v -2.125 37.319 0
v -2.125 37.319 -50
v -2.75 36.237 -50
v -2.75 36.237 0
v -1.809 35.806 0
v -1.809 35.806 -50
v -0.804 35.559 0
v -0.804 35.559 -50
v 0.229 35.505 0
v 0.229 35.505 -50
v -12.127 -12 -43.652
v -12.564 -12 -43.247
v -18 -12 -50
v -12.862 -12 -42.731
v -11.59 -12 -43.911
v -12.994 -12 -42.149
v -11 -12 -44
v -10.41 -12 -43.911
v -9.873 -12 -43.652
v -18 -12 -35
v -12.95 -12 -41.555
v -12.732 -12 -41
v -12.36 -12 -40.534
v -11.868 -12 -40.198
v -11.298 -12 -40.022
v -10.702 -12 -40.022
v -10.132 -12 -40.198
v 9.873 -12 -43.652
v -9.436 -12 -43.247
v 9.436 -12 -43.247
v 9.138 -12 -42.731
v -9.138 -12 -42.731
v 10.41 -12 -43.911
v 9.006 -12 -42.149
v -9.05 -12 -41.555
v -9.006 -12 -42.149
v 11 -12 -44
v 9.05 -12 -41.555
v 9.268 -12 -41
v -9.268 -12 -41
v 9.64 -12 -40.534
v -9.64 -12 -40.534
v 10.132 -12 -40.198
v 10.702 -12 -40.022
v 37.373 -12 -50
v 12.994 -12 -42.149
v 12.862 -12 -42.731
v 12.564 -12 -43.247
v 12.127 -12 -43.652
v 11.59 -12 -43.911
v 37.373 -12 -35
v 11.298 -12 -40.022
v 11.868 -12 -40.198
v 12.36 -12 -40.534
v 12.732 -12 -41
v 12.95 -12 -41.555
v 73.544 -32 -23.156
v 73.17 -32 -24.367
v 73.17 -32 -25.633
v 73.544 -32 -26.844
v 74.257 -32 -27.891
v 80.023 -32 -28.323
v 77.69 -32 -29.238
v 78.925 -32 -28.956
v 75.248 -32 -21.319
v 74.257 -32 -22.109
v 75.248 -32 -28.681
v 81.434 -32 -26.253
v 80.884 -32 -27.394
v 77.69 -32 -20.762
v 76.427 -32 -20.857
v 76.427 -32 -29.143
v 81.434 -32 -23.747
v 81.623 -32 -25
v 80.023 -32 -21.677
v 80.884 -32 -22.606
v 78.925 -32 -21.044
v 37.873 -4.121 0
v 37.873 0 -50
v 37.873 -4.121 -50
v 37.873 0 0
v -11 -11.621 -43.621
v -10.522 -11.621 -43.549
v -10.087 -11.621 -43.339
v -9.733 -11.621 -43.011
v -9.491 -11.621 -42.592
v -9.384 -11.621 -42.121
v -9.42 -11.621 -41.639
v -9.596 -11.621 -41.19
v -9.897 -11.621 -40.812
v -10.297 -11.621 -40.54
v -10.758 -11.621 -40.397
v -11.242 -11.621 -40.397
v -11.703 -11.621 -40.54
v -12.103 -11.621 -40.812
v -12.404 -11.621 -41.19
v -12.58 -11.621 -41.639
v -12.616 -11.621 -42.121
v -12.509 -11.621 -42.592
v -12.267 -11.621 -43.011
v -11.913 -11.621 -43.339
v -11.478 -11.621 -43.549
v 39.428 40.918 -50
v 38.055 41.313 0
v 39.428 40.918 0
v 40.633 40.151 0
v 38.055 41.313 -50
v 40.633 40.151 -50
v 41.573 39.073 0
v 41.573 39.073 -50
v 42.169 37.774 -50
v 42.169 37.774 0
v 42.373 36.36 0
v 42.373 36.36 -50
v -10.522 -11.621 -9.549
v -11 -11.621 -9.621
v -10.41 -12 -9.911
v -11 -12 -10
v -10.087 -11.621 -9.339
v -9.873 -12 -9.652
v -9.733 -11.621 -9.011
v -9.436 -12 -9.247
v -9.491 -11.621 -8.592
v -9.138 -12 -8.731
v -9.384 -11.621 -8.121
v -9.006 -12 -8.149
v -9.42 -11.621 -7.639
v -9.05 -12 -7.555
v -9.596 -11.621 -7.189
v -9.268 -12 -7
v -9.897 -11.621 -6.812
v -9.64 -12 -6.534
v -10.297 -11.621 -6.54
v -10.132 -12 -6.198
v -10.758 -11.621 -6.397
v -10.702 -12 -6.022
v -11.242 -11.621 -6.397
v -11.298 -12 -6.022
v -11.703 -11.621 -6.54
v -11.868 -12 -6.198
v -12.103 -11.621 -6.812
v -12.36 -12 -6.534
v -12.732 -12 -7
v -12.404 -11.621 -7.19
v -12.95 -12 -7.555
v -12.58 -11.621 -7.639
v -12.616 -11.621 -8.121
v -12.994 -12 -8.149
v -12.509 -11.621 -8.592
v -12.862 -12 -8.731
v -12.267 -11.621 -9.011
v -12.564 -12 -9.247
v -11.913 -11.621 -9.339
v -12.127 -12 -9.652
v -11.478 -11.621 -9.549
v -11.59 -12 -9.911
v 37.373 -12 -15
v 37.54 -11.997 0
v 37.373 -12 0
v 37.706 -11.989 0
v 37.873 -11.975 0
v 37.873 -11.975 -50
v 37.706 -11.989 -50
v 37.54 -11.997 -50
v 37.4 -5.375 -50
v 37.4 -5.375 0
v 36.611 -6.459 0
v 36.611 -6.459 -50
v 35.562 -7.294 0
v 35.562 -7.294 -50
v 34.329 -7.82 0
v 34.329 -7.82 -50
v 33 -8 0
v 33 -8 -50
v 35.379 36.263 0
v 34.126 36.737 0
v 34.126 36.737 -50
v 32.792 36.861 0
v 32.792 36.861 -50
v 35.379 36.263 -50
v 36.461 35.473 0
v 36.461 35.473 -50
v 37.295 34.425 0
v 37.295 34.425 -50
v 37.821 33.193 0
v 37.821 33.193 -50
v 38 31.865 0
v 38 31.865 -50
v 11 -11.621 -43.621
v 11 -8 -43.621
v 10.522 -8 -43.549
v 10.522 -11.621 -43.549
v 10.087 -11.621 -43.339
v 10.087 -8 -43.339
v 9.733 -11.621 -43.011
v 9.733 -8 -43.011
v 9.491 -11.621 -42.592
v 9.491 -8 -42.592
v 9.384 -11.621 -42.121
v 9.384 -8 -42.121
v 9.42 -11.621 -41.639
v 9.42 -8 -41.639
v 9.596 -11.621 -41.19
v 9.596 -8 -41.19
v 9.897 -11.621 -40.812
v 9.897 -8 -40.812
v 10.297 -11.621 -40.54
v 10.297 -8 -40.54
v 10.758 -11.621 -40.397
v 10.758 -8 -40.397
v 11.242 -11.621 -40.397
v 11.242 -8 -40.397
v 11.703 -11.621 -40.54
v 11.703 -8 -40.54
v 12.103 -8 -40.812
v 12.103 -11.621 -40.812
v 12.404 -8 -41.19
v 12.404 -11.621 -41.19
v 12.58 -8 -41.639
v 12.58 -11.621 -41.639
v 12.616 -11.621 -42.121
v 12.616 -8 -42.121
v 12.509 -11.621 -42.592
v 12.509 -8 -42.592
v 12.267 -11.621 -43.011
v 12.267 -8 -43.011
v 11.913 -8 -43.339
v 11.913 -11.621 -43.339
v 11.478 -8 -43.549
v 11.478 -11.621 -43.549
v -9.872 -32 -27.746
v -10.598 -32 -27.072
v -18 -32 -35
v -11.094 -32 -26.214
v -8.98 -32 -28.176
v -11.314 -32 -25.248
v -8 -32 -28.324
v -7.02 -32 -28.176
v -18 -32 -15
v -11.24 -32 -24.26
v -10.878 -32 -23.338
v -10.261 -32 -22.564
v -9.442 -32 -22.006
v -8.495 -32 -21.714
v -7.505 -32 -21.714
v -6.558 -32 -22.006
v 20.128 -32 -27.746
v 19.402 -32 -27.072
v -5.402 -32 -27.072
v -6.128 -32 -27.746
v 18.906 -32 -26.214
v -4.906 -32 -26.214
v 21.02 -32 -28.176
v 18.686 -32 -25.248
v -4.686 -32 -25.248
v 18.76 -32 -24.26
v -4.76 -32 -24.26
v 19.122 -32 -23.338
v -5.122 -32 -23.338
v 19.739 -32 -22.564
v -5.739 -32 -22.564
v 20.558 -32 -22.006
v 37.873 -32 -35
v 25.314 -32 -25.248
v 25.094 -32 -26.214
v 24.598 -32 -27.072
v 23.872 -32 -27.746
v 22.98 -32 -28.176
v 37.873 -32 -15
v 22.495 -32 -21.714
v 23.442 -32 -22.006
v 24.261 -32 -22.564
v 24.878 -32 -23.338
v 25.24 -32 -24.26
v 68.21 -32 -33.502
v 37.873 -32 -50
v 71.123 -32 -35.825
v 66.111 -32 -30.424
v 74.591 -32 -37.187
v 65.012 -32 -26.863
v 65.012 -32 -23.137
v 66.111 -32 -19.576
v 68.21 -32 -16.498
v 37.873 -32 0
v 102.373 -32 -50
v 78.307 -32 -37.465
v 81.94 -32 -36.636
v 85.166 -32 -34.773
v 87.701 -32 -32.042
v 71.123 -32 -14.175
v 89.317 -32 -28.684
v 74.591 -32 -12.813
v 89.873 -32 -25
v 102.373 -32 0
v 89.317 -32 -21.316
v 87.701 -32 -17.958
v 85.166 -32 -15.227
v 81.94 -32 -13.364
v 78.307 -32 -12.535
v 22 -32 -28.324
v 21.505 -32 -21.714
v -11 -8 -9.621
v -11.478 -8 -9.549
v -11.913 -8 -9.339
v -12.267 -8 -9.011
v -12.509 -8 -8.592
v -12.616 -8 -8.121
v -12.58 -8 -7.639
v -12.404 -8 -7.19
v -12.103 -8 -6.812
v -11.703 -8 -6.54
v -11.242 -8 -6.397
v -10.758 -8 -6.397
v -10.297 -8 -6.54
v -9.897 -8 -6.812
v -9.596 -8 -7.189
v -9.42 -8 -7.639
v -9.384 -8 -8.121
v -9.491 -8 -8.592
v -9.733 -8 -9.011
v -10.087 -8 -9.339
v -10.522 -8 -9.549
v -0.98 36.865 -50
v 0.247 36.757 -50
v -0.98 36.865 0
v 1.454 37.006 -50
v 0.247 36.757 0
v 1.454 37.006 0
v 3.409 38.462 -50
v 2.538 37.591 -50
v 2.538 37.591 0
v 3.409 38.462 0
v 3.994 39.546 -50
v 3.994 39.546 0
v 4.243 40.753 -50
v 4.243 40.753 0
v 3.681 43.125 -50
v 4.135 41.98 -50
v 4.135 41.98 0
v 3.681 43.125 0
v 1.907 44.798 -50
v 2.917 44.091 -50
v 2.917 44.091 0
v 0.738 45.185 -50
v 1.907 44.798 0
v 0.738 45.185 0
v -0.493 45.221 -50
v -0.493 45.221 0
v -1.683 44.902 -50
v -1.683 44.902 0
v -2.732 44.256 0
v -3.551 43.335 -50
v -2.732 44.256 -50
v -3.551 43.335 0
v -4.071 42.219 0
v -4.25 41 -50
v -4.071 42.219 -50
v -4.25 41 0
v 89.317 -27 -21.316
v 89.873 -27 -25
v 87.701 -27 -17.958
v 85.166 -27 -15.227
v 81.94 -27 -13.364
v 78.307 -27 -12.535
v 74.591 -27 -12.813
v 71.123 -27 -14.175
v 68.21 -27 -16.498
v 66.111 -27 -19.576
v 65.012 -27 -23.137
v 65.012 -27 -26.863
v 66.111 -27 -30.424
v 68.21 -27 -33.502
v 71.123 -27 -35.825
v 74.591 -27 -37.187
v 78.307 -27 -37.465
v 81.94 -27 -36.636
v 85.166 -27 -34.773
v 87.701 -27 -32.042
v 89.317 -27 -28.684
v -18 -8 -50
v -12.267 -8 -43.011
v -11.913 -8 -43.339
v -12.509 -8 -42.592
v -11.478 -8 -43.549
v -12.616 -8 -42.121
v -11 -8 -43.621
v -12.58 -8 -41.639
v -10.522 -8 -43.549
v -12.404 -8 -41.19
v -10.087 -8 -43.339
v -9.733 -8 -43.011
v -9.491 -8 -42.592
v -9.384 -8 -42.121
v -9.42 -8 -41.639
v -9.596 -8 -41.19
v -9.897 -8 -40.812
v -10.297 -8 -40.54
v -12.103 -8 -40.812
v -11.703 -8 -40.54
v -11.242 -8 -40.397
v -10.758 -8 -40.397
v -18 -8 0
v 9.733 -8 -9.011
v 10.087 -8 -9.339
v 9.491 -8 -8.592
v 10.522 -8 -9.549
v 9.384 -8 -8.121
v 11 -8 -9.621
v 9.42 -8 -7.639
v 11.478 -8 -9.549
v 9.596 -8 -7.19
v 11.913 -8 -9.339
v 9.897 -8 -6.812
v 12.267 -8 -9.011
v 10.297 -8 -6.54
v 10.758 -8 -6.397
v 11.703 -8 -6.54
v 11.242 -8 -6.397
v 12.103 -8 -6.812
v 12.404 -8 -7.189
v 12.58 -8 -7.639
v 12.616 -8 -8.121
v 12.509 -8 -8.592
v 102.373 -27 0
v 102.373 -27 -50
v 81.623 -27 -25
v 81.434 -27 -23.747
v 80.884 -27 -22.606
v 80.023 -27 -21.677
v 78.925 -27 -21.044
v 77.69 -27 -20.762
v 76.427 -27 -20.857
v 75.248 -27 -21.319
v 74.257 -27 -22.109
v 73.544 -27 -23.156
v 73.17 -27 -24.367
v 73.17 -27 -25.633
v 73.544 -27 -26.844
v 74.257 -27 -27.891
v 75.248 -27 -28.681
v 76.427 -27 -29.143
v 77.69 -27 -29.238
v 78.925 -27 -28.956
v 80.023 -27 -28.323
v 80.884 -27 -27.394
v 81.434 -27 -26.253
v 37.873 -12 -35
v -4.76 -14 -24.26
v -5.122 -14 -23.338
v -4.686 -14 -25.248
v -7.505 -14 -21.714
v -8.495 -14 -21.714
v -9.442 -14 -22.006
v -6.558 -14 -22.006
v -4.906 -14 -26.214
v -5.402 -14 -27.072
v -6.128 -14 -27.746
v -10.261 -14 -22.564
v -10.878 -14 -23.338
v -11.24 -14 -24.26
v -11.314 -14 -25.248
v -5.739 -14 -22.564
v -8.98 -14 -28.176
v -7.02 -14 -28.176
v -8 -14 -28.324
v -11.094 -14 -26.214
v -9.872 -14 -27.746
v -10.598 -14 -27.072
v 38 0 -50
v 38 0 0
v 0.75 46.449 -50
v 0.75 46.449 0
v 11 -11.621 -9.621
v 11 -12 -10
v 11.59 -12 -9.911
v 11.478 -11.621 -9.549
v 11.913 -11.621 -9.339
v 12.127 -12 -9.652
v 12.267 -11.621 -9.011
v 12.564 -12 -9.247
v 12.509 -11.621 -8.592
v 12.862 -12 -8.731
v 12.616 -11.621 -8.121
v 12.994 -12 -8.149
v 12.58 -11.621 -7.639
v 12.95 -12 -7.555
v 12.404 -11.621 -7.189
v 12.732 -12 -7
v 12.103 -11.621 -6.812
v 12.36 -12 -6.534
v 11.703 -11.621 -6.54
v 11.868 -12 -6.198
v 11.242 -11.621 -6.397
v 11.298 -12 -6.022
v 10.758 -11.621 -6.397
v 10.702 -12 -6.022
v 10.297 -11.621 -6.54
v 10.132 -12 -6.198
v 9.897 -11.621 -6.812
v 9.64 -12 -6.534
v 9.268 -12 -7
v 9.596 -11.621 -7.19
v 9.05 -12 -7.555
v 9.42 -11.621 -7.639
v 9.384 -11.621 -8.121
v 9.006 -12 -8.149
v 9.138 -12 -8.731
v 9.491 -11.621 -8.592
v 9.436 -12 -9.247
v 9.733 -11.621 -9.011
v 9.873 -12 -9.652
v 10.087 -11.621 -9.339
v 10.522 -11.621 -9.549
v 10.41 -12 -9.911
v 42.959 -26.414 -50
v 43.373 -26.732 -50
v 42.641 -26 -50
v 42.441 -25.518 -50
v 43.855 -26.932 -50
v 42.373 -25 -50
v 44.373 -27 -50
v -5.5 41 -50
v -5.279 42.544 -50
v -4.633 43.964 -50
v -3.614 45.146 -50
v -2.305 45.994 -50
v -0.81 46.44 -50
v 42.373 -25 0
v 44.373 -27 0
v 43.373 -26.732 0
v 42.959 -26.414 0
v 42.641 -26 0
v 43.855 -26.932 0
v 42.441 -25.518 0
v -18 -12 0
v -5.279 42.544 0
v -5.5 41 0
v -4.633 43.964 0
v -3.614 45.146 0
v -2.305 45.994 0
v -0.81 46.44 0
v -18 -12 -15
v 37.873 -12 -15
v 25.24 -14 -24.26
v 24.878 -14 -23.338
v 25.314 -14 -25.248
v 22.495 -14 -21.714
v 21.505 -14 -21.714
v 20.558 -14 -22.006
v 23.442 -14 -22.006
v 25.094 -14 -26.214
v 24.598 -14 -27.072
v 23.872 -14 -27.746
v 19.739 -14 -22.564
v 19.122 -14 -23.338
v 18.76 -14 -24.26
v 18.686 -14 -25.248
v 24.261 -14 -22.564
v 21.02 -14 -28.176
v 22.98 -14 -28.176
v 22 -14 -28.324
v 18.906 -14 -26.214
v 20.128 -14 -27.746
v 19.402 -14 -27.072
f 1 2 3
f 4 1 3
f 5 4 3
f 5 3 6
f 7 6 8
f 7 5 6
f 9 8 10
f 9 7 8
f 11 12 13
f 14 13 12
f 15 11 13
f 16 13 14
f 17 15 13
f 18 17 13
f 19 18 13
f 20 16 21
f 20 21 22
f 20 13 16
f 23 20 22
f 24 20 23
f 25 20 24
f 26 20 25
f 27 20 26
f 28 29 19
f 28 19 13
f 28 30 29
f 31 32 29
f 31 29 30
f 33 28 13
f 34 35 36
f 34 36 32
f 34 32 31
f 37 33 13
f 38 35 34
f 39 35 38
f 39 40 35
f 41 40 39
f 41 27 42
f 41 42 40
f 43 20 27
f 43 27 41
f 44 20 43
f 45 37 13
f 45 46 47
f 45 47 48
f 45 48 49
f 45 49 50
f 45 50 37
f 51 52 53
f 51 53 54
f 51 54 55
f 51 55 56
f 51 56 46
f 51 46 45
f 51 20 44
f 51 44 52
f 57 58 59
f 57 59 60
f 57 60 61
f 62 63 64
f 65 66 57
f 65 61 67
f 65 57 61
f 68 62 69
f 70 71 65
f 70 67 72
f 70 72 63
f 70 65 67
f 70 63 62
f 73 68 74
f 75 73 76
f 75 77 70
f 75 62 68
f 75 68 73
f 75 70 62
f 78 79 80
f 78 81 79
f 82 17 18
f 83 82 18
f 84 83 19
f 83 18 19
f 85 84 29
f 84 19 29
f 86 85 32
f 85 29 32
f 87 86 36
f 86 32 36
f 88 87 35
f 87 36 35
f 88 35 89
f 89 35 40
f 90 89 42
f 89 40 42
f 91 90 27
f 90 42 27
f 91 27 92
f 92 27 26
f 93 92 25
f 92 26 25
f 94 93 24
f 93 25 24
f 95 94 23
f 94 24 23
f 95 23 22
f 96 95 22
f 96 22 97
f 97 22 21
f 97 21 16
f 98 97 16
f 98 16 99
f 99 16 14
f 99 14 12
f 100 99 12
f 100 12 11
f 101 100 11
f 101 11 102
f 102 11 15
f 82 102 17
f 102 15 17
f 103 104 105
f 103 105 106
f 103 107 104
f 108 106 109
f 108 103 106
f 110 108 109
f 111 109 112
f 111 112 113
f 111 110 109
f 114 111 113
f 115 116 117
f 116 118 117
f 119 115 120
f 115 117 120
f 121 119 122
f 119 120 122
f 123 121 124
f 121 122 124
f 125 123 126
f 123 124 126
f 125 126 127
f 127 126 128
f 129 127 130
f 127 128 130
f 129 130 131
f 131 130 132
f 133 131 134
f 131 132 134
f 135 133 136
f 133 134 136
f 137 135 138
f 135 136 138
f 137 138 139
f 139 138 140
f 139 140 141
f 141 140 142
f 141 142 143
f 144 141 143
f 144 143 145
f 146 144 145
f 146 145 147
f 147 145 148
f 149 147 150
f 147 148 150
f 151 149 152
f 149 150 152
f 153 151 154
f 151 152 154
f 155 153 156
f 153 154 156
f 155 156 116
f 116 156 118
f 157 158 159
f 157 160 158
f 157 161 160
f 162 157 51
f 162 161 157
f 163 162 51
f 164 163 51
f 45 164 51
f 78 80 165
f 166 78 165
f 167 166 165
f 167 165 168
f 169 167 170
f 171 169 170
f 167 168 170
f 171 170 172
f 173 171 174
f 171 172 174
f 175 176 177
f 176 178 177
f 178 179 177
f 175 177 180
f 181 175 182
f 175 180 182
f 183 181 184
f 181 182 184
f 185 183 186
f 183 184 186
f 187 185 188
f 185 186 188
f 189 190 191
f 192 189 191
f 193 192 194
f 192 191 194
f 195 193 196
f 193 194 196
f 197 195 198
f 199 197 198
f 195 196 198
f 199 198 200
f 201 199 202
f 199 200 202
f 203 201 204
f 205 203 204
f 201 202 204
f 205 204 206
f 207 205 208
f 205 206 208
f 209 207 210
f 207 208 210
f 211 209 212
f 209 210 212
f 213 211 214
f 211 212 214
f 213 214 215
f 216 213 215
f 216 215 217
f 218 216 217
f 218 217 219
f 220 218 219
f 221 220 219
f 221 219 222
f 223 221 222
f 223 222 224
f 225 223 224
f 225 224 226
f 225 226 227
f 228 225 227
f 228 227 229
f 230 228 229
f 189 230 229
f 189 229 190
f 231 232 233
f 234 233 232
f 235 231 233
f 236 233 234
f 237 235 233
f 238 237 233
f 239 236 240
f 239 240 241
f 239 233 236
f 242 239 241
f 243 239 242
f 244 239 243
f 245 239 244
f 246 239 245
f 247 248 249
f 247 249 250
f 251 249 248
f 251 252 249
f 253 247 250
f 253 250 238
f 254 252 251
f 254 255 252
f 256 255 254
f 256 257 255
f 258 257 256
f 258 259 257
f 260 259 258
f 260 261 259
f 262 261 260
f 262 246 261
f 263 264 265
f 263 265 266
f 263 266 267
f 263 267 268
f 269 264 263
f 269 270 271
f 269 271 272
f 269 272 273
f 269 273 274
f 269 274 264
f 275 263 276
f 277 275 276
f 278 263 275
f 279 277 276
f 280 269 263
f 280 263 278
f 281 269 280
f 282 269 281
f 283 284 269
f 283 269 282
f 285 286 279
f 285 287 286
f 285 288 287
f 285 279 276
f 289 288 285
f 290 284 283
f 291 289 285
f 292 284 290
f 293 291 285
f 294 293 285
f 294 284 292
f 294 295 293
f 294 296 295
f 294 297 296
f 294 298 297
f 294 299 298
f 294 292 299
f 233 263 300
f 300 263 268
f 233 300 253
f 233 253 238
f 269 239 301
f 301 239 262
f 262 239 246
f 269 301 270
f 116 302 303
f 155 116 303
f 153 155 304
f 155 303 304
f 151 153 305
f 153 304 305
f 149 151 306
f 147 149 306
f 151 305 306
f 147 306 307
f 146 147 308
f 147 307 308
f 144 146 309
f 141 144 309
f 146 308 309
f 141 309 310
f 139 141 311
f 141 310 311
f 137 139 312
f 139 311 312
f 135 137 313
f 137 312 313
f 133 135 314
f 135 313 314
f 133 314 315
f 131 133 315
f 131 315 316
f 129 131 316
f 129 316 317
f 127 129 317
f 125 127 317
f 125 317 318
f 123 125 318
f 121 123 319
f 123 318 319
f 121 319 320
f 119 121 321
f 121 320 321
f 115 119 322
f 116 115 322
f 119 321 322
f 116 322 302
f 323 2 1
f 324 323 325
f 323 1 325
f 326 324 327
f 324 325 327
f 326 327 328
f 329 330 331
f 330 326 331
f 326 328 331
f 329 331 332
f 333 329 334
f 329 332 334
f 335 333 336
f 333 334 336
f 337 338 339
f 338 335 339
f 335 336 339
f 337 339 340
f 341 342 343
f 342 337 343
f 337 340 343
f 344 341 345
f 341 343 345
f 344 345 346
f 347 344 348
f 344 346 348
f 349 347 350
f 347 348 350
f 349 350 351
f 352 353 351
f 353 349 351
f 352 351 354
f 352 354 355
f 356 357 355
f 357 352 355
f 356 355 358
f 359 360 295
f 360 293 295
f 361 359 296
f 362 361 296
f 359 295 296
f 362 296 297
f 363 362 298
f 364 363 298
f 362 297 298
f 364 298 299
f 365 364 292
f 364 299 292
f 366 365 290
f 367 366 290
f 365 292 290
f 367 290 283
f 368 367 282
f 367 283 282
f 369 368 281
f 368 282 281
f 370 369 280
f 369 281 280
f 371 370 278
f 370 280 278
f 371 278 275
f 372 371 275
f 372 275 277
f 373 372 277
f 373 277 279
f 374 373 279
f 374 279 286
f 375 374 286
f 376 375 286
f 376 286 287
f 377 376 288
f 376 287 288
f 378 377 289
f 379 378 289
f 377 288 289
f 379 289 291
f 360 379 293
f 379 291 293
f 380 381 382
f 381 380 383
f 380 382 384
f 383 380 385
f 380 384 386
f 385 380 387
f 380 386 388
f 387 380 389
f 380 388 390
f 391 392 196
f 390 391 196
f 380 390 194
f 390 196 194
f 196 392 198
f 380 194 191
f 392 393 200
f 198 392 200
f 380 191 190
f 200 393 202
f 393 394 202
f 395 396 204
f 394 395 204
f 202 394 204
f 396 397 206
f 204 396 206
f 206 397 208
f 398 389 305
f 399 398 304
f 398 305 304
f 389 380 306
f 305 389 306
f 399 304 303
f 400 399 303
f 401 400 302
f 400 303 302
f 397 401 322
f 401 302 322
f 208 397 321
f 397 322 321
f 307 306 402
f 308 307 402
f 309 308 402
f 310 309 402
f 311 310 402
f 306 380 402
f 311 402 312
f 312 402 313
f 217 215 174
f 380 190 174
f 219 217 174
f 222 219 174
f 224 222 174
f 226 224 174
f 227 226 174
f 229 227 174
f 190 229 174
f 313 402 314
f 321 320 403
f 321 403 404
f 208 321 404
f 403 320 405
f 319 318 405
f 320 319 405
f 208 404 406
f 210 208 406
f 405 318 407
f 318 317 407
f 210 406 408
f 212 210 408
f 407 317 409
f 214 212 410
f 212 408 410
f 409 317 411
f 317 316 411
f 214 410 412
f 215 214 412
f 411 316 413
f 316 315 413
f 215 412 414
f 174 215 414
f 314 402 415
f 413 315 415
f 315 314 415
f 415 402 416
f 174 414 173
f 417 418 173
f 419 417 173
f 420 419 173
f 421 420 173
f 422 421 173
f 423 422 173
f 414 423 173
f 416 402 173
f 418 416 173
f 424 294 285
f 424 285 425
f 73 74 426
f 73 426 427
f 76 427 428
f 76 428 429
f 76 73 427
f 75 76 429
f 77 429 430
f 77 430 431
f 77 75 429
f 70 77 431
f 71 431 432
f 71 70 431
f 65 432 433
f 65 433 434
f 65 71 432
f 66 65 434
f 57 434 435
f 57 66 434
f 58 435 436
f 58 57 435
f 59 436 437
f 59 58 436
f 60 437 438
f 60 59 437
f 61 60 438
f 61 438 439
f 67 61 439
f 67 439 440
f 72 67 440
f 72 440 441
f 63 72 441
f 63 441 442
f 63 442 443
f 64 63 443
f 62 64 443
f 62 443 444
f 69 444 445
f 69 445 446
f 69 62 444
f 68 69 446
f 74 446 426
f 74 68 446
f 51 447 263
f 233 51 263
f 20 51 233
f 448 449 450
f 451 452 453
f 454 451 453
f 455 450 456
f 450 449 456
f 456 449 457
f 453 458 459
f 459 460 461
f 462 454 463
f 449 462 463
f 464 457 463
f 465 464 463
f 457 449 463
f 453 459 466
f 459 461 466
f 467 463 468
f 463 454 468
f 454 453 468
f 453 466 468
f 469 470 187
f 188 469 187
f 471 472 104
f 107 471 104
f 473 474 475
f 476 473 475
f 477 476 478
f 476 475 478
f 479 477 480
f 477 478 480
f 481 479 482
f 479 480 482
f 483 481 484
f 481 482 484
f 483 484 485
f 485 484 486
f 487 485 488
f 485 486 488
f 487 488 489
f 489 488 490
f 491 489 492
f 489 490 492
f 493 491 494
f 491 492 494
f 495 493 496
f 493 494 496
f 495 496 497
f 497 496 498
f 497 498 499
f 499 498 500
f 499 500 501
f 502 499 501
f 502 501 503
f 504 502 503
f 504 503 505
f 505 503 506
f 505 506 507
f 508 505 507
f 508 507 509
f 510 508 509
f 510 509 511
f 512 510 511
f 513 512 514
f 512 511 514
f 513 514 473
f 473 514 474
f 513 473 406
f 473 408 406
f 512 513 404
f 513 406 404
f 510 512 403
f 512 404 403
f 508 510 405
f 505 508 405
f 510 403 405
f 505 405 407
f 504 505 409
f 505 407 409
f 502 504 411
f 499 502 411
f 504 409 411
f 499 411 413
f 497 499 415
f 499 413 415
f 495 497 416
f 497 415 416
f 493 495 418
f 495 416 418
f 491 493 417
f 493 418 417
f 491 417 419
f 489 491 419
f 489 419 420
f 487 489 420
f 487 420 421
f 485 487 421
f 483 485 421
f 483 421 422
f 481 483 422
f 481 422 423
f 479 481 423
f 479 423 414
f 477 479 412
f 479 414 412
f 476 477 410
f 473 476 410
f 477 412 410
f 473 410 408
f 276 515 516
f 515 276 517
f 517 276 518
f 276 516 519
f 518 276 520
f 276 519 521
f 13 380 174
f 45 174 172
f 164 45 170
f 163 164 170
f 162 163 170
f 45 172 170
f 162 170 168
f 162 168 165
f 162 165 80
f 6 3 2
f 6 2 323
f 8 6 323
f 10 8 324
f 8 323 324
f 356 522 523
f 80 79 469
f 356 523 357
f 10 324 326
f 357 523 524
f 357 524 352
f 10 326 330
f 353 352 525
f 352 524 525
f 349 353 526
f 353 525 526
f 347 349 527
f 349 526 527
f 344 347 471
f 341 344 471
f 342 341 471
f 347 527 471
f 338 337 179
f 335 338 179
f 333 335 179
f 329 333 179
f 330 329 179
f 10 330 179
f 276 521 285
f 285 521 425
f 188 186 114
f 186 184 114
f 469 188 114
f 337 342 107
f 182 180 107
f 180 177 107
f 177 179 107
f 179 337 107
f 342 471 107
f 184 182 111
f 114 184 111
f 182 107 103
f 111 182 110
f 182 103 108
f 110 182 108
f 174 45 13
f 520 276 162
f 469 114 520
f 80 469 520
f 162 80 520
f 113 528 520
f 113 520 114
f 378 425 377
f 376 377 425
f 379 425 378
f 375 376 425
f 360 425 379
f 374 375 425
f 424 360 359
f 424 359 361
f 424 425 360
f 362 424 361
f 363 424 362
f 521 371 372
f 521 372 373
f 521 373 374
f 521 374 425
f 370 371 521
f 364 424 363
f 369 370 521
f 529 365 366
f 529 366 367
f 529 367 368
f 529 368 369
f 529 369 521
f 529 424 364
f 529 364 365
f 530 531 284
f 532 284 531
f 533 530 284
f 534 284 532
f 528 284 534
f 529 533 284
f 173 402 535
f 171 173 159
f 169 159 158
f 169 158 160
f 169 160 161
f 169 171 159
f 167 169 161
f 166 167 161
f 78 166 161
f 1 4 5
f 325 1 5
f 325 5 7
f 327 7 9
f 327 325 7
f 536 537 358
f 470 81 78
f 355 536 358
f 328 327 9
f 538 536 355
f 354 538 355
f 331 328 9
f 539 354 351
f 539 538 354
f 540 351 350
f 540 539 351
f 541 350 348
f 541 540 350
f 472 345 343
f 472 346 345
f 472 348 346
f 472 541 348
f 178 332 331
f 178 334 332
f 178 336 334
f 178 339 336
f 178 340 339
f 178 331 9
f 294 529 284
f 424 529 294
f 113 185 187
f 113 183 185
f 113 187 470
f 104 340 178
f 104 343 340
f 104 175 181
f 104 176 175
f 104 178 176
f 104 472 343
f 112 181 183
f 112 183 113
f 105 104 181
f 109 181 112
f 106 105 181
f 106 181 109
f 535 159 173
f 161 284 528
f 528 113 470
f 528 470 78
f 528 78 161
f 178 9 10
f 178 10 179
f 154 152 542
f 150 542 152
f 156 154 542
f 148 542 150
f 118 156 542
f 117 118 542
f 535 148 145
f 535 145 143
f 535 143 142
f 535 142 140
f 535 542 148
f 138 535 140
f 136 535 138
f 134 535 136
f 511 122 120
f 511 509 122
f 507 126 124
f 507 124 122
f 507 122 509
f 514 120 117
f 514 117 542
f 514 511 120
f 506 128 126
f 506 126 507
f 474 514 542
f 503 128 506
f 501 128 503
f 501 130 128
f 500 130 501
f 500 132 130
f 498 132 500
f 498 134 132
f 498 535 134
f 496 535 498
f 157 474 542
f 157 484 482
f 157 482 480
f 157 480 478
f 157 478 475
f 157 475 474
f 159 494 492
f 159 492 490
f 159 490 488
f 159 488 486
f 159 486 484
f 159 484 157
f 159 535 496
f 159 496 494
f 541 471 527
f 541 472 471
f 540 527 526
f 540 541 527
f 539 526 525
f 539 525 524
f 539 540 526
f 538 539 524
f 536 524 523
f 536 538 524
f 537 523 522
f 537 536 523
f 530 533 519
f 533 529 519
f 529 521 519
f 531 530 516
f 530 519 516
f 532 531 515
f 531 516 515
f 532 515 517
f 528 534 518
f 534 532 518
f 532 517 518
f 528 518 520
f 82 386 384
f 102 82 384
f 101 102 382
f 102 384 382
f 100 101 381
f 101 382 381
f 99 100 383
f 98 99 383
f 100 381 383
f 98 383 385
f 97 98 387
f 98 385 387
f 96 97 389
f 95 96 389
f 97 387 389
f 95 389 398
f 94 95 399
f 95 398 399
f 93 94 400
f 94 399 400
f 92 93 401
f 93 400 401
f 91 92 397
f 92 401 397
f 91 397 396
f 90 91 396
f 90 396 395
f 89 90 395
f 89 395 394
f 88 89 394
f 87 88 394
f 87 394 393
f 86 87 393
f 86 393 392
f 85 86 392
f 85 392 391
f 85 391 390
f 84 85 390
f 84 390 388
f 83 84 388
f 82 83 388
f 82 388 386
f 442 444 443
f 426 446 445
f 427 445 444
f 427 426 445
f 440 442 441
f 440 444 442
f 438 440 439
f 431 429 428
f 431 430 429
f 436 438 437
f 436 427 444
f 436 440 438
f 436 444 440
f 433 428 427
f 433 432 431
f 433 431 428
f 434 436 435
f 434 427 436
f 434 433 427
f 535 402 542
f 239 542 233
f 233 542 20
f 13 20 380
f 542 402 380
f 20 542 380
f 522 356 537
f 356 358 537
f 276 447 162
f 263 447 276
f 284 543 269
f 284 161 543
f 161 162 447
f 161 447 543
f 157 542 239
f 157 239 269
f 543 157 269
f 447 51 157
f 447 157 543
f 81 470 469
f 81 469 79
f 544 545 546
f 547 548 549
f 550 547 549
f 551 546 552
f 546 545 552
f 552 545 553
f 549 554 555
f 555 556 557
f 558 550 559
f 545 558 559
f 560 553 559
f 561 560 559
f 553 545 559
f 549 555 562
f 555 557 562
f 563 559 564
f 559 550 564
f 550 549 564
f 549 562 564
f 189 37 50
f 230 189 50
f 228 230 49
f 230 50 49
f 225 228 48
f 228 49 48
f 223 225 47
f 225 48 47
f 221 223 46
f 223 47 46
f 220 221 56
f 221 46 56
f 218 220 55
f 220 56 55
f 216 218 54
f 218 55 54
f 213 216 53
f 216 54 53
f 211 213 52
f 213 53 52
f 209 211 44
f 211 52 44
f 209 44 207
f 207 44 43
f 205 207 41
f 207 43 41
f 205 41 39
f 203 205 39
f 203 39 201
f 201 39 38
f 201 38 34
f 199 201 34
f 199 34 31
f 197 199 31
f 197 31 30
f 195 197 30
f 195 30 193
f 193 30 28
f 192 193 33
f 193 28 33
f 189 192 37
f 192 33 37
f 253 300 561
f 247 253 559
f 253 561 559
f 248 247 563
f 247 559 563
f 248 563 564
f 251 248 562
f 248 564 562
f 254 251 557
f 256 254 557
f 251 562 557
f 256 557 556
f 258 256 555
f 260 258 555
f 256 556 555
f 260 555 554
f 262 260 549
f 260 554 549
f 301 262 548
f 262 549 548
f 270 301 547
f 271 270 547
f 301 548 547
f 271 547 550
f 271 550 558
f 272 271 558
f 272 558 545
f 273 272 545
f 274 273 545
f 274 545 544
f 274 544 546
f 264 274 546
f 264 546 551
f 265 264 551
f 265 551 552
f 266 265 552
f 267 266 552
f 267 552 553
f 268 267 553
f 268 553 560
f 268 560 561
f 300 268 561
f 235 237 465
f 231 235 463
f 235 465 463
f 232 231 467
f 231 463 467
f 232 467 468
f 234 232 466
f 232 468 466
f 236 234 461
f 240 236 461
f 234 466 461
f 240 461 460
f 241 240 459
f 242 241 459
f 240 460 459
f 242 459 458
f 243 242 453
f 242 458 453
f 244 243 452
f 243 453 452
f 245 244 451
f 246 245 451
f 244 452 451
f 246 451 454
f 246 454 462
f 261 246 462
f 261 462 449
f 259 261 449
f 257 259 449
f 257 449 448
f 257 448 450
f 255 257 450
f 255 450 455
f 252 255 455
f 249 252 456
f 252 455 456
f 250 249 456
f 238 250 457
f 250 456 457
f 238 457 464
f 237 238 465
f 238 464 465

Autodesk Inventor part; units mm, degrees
ref_plane "YZ Plane" through (0, 0, 0) normal (1, 0, 0) x (0, 1, 0)
ref_plane "XZ Plane" through (0, 0, 0) normal (0, 1, 0) x (-1, 0, 0)
ref_plane "XY Plane" through (0, 0, 0) normal (0, 0, 1) x (1, 0, 0)
sketch "草图1" plane through (0, 0, 0) normal (0, 0, 1) x (1, 0, 0)
  circle A0 centre (0, 41) radius 4.25 projected
  circle A1 centre (0, 41) radius 4.25
  line L0 (0, 41) -> (-2.75, 36.2369)
  line L1 (0, 41) -> (5.5, 41) construction
  line L2 (0, 41) -> (-5.5, 41)
  line L3 (0.7501, 46.4486) -> (42.3728, 40.7189)
  line L4 (-15, 3) -> (-15, 6) projected
  line L5 (-15, 6) -> (-18, 6) projected
  line L6 (-18, 6) -> (-18, -8) projected
  line L7 (-4, -8) -> (-18, -8) projected
  line L8 (-4, -6) -> (-4, -8) projected
  line L9 (-4, -6) -> (4, -6) projected
  line L10 (4, -6) -> (4, -8) projected
  line L11 (18, -8) -> (4, -8) projected
  line L12 (18, 6) -> (18, -8) projected
  line L13 (18, 6) -> (15, 6) projected
  line L14 (15, 6) -> (15, 3) projected
  line L15 (15, 3) -> (13.5, 3) projected
  line L16 (13.5, 3) -> (13.5, 2) projected
  line L17 (13.5, 2) -> (15, 2) projected
  line L18 (15, 2) -> (15, -2) projected
  line L19 (15, -2) -> (-15, -2) projected
  line L20 (-15, -2) -> (-15, 2) projected
  line L21 (-15, 2) -> (-13.5, 2) projected
  line L22 (-13.5, 2) -> (-13.5, 3) projected
  line L23 (-13.5, 3) -> (-15, 3) projected
  line L24 (-18, -8) -> (18, -8)
  line L25 (18, -8) -> (18, -12)
  line L26 (18, -12) -> (-18, -12)
  line L27 (-18, -12) -> (-18, -8)
  line L28 (18, -12) -> (42.3728, -12)
  line L29 (42.3728, -12) -> (42.3728, 40.7189)
  line L30 (18, -8) -> (38, -8)
  line L31 (38, -8) -> (38, 37.0777)
  line L32 (0.2288, 35.5048) -> (38, 37.0777)
  arc A2 (-2.75, 36.2369) -> (0.2288, 35.5048) centre (0, 41) ccw
  arc A3 (0.7501, 46.4486) -> (-5.5, 41) centre (0, 41) ccw
  point P0 (0, 0)
  point P1 (-4.25, 41)
  point P2 (-2.125, 37.3194)
  dimension "d1" = 120
  dimension "d2" = 4
  dimension "d3" = 20
extrude "拉伸1" add sketch "草图1" against normal blind 50 contours A0 L2 A3 L3 L29 L28 L25 L30 L31 L32 A2 L0 | L26 L27 L7 L24 L11 L25
fillet "圆角1" radius 5 2 edges at (38, 37.0777, -25) (42.3728, 40.7189, -25)
fillet "圆角2" radius 5 2 edges at (38, -8, -25) (42.3728, -12, -25)
sketch "草图2" plane through (-18, -12, -50) normal (0, -1, 0) x (1, 0, 0)
  line L0 (0, 50) -> (55.3728, 50) projected
  line L1 (0, 50) -> (0, 0) projected
  line L2 (55.3728, 0) -> (0, 0) projected
  point P0 (18, 50)
  point P1 (7, 42)
  point P2 (7, 8)
  point P3 (29, 42)
  point P4 (29, 8)
  dimension "d8" = 8
  dimension "d9" = 7
  dimension "d10" = 8
  dimension "d11" = 22
hole "孔1" at (-11, -12, -8) at (-11, -12, -42) at (11, -12, -8) at (11, -12, -42) direction (0, 1, 0) diameter 3.242 depth 4 countersink diameter 4 countersink angle 90 thread size "M4x0.7" designation "M4" class "6H" standard "GB Metric profile"
sketch "草图5" plane through (0, 0, 0) normal (0, 0, 1) x (1, 0, 0)
  line L0 (42.3728, 36.36) -> (42.3728, -7) projected
  line L1 (42.3728, 0) -> (37.8728, 0)
  line L2 (37.8728, 0) -> (37.8728, -32)
  line L3 (37.8728, -32) -> (42.3728, -32)
  line L4 (42.3728, -32) -> (42.3728, 0)
  line L5 (37.8728, -32) -> (102.3728, -32)
  line L6 (102.3728, -32) -> (102.3728, -27)
  line L7 (102.3728, -27) -> (37.8728, -27)
  line L8 (37.8728, -27) -> (37.8728, -32)
  point P0 (0, 0)
  point P1 (42.3728, -27)
  dimension "d26" = 4.5
  dimension "d27" = 32
  dimension "d28" = 64.5
  dimension "d29" = 5
extrude "拉伸4" add sketch "草图5" against normal blind 50
fillet "圆角3" radius 2 1 edges at (42.3728, -27, -25)
sketch "草图6" plane through (37.8728, -32, 0) normal (0, -1, 0) x (1, 0, 0)
  circle A0 centre (39.5, -25) radius 4.25 projected
  circle A1 centre (39.5, -25) radius 12.5
  point P0 (-37.8728, 0)
  dimension "d33" = 25
extrude "拉伸5" cut sketch "草图6" against normal blind 10
sketch "草图7" plane through (-18, -12, -50) normal (0, -1, 0) x (1, 0, 0)
  line L0 (0, 50) -> (0, 0) projected
  line L1 (55.8728, 0) -> (55.8728, 50) projected
  line L2 (0, 35) -> (55.8728, 35)
  line L3 (55.8728, 35) -> (55.8728, 15)
  line L4 (55.8728, 15) -> (0, 15)
  line L5 (0, 15) -> (0, 35)
  line L6 (0, 50) -> (55.3728, 50) projected
  point P0 (18, 50)
  point P1 (0, 15)
  dimension "d36" = 20
  dimension "d37" = 15
extrude "拉伸6" add sketch "草图7" along normal up to surface (20 mm away)
sketch "草图8" plane through (37.8728, -32, 0) normal (0, -1, 0) x (1, 0, 0)
  line L0 (-55.8728, -15) -> (0, -15) projected
  line L1 (-55.8728, -35) -> (-55.8728, -15) projected
  point P0 (-37.8728, 0)
  point P1 (-45.8728, -25)
  point P2 (-15.8728, -25)
  dimension "d40" = 10
  dimension "d41" = 10
  dimension "d42" = 30
hole "孔2" at (-8, -32, -25) at (22, -32, -25) direction (0, 1, 0) diameter 6.647 depth 18 thread size "M8x1.25" designation "M8" class "6H" standard "GB Metric profile"
properties part number "链接板"
